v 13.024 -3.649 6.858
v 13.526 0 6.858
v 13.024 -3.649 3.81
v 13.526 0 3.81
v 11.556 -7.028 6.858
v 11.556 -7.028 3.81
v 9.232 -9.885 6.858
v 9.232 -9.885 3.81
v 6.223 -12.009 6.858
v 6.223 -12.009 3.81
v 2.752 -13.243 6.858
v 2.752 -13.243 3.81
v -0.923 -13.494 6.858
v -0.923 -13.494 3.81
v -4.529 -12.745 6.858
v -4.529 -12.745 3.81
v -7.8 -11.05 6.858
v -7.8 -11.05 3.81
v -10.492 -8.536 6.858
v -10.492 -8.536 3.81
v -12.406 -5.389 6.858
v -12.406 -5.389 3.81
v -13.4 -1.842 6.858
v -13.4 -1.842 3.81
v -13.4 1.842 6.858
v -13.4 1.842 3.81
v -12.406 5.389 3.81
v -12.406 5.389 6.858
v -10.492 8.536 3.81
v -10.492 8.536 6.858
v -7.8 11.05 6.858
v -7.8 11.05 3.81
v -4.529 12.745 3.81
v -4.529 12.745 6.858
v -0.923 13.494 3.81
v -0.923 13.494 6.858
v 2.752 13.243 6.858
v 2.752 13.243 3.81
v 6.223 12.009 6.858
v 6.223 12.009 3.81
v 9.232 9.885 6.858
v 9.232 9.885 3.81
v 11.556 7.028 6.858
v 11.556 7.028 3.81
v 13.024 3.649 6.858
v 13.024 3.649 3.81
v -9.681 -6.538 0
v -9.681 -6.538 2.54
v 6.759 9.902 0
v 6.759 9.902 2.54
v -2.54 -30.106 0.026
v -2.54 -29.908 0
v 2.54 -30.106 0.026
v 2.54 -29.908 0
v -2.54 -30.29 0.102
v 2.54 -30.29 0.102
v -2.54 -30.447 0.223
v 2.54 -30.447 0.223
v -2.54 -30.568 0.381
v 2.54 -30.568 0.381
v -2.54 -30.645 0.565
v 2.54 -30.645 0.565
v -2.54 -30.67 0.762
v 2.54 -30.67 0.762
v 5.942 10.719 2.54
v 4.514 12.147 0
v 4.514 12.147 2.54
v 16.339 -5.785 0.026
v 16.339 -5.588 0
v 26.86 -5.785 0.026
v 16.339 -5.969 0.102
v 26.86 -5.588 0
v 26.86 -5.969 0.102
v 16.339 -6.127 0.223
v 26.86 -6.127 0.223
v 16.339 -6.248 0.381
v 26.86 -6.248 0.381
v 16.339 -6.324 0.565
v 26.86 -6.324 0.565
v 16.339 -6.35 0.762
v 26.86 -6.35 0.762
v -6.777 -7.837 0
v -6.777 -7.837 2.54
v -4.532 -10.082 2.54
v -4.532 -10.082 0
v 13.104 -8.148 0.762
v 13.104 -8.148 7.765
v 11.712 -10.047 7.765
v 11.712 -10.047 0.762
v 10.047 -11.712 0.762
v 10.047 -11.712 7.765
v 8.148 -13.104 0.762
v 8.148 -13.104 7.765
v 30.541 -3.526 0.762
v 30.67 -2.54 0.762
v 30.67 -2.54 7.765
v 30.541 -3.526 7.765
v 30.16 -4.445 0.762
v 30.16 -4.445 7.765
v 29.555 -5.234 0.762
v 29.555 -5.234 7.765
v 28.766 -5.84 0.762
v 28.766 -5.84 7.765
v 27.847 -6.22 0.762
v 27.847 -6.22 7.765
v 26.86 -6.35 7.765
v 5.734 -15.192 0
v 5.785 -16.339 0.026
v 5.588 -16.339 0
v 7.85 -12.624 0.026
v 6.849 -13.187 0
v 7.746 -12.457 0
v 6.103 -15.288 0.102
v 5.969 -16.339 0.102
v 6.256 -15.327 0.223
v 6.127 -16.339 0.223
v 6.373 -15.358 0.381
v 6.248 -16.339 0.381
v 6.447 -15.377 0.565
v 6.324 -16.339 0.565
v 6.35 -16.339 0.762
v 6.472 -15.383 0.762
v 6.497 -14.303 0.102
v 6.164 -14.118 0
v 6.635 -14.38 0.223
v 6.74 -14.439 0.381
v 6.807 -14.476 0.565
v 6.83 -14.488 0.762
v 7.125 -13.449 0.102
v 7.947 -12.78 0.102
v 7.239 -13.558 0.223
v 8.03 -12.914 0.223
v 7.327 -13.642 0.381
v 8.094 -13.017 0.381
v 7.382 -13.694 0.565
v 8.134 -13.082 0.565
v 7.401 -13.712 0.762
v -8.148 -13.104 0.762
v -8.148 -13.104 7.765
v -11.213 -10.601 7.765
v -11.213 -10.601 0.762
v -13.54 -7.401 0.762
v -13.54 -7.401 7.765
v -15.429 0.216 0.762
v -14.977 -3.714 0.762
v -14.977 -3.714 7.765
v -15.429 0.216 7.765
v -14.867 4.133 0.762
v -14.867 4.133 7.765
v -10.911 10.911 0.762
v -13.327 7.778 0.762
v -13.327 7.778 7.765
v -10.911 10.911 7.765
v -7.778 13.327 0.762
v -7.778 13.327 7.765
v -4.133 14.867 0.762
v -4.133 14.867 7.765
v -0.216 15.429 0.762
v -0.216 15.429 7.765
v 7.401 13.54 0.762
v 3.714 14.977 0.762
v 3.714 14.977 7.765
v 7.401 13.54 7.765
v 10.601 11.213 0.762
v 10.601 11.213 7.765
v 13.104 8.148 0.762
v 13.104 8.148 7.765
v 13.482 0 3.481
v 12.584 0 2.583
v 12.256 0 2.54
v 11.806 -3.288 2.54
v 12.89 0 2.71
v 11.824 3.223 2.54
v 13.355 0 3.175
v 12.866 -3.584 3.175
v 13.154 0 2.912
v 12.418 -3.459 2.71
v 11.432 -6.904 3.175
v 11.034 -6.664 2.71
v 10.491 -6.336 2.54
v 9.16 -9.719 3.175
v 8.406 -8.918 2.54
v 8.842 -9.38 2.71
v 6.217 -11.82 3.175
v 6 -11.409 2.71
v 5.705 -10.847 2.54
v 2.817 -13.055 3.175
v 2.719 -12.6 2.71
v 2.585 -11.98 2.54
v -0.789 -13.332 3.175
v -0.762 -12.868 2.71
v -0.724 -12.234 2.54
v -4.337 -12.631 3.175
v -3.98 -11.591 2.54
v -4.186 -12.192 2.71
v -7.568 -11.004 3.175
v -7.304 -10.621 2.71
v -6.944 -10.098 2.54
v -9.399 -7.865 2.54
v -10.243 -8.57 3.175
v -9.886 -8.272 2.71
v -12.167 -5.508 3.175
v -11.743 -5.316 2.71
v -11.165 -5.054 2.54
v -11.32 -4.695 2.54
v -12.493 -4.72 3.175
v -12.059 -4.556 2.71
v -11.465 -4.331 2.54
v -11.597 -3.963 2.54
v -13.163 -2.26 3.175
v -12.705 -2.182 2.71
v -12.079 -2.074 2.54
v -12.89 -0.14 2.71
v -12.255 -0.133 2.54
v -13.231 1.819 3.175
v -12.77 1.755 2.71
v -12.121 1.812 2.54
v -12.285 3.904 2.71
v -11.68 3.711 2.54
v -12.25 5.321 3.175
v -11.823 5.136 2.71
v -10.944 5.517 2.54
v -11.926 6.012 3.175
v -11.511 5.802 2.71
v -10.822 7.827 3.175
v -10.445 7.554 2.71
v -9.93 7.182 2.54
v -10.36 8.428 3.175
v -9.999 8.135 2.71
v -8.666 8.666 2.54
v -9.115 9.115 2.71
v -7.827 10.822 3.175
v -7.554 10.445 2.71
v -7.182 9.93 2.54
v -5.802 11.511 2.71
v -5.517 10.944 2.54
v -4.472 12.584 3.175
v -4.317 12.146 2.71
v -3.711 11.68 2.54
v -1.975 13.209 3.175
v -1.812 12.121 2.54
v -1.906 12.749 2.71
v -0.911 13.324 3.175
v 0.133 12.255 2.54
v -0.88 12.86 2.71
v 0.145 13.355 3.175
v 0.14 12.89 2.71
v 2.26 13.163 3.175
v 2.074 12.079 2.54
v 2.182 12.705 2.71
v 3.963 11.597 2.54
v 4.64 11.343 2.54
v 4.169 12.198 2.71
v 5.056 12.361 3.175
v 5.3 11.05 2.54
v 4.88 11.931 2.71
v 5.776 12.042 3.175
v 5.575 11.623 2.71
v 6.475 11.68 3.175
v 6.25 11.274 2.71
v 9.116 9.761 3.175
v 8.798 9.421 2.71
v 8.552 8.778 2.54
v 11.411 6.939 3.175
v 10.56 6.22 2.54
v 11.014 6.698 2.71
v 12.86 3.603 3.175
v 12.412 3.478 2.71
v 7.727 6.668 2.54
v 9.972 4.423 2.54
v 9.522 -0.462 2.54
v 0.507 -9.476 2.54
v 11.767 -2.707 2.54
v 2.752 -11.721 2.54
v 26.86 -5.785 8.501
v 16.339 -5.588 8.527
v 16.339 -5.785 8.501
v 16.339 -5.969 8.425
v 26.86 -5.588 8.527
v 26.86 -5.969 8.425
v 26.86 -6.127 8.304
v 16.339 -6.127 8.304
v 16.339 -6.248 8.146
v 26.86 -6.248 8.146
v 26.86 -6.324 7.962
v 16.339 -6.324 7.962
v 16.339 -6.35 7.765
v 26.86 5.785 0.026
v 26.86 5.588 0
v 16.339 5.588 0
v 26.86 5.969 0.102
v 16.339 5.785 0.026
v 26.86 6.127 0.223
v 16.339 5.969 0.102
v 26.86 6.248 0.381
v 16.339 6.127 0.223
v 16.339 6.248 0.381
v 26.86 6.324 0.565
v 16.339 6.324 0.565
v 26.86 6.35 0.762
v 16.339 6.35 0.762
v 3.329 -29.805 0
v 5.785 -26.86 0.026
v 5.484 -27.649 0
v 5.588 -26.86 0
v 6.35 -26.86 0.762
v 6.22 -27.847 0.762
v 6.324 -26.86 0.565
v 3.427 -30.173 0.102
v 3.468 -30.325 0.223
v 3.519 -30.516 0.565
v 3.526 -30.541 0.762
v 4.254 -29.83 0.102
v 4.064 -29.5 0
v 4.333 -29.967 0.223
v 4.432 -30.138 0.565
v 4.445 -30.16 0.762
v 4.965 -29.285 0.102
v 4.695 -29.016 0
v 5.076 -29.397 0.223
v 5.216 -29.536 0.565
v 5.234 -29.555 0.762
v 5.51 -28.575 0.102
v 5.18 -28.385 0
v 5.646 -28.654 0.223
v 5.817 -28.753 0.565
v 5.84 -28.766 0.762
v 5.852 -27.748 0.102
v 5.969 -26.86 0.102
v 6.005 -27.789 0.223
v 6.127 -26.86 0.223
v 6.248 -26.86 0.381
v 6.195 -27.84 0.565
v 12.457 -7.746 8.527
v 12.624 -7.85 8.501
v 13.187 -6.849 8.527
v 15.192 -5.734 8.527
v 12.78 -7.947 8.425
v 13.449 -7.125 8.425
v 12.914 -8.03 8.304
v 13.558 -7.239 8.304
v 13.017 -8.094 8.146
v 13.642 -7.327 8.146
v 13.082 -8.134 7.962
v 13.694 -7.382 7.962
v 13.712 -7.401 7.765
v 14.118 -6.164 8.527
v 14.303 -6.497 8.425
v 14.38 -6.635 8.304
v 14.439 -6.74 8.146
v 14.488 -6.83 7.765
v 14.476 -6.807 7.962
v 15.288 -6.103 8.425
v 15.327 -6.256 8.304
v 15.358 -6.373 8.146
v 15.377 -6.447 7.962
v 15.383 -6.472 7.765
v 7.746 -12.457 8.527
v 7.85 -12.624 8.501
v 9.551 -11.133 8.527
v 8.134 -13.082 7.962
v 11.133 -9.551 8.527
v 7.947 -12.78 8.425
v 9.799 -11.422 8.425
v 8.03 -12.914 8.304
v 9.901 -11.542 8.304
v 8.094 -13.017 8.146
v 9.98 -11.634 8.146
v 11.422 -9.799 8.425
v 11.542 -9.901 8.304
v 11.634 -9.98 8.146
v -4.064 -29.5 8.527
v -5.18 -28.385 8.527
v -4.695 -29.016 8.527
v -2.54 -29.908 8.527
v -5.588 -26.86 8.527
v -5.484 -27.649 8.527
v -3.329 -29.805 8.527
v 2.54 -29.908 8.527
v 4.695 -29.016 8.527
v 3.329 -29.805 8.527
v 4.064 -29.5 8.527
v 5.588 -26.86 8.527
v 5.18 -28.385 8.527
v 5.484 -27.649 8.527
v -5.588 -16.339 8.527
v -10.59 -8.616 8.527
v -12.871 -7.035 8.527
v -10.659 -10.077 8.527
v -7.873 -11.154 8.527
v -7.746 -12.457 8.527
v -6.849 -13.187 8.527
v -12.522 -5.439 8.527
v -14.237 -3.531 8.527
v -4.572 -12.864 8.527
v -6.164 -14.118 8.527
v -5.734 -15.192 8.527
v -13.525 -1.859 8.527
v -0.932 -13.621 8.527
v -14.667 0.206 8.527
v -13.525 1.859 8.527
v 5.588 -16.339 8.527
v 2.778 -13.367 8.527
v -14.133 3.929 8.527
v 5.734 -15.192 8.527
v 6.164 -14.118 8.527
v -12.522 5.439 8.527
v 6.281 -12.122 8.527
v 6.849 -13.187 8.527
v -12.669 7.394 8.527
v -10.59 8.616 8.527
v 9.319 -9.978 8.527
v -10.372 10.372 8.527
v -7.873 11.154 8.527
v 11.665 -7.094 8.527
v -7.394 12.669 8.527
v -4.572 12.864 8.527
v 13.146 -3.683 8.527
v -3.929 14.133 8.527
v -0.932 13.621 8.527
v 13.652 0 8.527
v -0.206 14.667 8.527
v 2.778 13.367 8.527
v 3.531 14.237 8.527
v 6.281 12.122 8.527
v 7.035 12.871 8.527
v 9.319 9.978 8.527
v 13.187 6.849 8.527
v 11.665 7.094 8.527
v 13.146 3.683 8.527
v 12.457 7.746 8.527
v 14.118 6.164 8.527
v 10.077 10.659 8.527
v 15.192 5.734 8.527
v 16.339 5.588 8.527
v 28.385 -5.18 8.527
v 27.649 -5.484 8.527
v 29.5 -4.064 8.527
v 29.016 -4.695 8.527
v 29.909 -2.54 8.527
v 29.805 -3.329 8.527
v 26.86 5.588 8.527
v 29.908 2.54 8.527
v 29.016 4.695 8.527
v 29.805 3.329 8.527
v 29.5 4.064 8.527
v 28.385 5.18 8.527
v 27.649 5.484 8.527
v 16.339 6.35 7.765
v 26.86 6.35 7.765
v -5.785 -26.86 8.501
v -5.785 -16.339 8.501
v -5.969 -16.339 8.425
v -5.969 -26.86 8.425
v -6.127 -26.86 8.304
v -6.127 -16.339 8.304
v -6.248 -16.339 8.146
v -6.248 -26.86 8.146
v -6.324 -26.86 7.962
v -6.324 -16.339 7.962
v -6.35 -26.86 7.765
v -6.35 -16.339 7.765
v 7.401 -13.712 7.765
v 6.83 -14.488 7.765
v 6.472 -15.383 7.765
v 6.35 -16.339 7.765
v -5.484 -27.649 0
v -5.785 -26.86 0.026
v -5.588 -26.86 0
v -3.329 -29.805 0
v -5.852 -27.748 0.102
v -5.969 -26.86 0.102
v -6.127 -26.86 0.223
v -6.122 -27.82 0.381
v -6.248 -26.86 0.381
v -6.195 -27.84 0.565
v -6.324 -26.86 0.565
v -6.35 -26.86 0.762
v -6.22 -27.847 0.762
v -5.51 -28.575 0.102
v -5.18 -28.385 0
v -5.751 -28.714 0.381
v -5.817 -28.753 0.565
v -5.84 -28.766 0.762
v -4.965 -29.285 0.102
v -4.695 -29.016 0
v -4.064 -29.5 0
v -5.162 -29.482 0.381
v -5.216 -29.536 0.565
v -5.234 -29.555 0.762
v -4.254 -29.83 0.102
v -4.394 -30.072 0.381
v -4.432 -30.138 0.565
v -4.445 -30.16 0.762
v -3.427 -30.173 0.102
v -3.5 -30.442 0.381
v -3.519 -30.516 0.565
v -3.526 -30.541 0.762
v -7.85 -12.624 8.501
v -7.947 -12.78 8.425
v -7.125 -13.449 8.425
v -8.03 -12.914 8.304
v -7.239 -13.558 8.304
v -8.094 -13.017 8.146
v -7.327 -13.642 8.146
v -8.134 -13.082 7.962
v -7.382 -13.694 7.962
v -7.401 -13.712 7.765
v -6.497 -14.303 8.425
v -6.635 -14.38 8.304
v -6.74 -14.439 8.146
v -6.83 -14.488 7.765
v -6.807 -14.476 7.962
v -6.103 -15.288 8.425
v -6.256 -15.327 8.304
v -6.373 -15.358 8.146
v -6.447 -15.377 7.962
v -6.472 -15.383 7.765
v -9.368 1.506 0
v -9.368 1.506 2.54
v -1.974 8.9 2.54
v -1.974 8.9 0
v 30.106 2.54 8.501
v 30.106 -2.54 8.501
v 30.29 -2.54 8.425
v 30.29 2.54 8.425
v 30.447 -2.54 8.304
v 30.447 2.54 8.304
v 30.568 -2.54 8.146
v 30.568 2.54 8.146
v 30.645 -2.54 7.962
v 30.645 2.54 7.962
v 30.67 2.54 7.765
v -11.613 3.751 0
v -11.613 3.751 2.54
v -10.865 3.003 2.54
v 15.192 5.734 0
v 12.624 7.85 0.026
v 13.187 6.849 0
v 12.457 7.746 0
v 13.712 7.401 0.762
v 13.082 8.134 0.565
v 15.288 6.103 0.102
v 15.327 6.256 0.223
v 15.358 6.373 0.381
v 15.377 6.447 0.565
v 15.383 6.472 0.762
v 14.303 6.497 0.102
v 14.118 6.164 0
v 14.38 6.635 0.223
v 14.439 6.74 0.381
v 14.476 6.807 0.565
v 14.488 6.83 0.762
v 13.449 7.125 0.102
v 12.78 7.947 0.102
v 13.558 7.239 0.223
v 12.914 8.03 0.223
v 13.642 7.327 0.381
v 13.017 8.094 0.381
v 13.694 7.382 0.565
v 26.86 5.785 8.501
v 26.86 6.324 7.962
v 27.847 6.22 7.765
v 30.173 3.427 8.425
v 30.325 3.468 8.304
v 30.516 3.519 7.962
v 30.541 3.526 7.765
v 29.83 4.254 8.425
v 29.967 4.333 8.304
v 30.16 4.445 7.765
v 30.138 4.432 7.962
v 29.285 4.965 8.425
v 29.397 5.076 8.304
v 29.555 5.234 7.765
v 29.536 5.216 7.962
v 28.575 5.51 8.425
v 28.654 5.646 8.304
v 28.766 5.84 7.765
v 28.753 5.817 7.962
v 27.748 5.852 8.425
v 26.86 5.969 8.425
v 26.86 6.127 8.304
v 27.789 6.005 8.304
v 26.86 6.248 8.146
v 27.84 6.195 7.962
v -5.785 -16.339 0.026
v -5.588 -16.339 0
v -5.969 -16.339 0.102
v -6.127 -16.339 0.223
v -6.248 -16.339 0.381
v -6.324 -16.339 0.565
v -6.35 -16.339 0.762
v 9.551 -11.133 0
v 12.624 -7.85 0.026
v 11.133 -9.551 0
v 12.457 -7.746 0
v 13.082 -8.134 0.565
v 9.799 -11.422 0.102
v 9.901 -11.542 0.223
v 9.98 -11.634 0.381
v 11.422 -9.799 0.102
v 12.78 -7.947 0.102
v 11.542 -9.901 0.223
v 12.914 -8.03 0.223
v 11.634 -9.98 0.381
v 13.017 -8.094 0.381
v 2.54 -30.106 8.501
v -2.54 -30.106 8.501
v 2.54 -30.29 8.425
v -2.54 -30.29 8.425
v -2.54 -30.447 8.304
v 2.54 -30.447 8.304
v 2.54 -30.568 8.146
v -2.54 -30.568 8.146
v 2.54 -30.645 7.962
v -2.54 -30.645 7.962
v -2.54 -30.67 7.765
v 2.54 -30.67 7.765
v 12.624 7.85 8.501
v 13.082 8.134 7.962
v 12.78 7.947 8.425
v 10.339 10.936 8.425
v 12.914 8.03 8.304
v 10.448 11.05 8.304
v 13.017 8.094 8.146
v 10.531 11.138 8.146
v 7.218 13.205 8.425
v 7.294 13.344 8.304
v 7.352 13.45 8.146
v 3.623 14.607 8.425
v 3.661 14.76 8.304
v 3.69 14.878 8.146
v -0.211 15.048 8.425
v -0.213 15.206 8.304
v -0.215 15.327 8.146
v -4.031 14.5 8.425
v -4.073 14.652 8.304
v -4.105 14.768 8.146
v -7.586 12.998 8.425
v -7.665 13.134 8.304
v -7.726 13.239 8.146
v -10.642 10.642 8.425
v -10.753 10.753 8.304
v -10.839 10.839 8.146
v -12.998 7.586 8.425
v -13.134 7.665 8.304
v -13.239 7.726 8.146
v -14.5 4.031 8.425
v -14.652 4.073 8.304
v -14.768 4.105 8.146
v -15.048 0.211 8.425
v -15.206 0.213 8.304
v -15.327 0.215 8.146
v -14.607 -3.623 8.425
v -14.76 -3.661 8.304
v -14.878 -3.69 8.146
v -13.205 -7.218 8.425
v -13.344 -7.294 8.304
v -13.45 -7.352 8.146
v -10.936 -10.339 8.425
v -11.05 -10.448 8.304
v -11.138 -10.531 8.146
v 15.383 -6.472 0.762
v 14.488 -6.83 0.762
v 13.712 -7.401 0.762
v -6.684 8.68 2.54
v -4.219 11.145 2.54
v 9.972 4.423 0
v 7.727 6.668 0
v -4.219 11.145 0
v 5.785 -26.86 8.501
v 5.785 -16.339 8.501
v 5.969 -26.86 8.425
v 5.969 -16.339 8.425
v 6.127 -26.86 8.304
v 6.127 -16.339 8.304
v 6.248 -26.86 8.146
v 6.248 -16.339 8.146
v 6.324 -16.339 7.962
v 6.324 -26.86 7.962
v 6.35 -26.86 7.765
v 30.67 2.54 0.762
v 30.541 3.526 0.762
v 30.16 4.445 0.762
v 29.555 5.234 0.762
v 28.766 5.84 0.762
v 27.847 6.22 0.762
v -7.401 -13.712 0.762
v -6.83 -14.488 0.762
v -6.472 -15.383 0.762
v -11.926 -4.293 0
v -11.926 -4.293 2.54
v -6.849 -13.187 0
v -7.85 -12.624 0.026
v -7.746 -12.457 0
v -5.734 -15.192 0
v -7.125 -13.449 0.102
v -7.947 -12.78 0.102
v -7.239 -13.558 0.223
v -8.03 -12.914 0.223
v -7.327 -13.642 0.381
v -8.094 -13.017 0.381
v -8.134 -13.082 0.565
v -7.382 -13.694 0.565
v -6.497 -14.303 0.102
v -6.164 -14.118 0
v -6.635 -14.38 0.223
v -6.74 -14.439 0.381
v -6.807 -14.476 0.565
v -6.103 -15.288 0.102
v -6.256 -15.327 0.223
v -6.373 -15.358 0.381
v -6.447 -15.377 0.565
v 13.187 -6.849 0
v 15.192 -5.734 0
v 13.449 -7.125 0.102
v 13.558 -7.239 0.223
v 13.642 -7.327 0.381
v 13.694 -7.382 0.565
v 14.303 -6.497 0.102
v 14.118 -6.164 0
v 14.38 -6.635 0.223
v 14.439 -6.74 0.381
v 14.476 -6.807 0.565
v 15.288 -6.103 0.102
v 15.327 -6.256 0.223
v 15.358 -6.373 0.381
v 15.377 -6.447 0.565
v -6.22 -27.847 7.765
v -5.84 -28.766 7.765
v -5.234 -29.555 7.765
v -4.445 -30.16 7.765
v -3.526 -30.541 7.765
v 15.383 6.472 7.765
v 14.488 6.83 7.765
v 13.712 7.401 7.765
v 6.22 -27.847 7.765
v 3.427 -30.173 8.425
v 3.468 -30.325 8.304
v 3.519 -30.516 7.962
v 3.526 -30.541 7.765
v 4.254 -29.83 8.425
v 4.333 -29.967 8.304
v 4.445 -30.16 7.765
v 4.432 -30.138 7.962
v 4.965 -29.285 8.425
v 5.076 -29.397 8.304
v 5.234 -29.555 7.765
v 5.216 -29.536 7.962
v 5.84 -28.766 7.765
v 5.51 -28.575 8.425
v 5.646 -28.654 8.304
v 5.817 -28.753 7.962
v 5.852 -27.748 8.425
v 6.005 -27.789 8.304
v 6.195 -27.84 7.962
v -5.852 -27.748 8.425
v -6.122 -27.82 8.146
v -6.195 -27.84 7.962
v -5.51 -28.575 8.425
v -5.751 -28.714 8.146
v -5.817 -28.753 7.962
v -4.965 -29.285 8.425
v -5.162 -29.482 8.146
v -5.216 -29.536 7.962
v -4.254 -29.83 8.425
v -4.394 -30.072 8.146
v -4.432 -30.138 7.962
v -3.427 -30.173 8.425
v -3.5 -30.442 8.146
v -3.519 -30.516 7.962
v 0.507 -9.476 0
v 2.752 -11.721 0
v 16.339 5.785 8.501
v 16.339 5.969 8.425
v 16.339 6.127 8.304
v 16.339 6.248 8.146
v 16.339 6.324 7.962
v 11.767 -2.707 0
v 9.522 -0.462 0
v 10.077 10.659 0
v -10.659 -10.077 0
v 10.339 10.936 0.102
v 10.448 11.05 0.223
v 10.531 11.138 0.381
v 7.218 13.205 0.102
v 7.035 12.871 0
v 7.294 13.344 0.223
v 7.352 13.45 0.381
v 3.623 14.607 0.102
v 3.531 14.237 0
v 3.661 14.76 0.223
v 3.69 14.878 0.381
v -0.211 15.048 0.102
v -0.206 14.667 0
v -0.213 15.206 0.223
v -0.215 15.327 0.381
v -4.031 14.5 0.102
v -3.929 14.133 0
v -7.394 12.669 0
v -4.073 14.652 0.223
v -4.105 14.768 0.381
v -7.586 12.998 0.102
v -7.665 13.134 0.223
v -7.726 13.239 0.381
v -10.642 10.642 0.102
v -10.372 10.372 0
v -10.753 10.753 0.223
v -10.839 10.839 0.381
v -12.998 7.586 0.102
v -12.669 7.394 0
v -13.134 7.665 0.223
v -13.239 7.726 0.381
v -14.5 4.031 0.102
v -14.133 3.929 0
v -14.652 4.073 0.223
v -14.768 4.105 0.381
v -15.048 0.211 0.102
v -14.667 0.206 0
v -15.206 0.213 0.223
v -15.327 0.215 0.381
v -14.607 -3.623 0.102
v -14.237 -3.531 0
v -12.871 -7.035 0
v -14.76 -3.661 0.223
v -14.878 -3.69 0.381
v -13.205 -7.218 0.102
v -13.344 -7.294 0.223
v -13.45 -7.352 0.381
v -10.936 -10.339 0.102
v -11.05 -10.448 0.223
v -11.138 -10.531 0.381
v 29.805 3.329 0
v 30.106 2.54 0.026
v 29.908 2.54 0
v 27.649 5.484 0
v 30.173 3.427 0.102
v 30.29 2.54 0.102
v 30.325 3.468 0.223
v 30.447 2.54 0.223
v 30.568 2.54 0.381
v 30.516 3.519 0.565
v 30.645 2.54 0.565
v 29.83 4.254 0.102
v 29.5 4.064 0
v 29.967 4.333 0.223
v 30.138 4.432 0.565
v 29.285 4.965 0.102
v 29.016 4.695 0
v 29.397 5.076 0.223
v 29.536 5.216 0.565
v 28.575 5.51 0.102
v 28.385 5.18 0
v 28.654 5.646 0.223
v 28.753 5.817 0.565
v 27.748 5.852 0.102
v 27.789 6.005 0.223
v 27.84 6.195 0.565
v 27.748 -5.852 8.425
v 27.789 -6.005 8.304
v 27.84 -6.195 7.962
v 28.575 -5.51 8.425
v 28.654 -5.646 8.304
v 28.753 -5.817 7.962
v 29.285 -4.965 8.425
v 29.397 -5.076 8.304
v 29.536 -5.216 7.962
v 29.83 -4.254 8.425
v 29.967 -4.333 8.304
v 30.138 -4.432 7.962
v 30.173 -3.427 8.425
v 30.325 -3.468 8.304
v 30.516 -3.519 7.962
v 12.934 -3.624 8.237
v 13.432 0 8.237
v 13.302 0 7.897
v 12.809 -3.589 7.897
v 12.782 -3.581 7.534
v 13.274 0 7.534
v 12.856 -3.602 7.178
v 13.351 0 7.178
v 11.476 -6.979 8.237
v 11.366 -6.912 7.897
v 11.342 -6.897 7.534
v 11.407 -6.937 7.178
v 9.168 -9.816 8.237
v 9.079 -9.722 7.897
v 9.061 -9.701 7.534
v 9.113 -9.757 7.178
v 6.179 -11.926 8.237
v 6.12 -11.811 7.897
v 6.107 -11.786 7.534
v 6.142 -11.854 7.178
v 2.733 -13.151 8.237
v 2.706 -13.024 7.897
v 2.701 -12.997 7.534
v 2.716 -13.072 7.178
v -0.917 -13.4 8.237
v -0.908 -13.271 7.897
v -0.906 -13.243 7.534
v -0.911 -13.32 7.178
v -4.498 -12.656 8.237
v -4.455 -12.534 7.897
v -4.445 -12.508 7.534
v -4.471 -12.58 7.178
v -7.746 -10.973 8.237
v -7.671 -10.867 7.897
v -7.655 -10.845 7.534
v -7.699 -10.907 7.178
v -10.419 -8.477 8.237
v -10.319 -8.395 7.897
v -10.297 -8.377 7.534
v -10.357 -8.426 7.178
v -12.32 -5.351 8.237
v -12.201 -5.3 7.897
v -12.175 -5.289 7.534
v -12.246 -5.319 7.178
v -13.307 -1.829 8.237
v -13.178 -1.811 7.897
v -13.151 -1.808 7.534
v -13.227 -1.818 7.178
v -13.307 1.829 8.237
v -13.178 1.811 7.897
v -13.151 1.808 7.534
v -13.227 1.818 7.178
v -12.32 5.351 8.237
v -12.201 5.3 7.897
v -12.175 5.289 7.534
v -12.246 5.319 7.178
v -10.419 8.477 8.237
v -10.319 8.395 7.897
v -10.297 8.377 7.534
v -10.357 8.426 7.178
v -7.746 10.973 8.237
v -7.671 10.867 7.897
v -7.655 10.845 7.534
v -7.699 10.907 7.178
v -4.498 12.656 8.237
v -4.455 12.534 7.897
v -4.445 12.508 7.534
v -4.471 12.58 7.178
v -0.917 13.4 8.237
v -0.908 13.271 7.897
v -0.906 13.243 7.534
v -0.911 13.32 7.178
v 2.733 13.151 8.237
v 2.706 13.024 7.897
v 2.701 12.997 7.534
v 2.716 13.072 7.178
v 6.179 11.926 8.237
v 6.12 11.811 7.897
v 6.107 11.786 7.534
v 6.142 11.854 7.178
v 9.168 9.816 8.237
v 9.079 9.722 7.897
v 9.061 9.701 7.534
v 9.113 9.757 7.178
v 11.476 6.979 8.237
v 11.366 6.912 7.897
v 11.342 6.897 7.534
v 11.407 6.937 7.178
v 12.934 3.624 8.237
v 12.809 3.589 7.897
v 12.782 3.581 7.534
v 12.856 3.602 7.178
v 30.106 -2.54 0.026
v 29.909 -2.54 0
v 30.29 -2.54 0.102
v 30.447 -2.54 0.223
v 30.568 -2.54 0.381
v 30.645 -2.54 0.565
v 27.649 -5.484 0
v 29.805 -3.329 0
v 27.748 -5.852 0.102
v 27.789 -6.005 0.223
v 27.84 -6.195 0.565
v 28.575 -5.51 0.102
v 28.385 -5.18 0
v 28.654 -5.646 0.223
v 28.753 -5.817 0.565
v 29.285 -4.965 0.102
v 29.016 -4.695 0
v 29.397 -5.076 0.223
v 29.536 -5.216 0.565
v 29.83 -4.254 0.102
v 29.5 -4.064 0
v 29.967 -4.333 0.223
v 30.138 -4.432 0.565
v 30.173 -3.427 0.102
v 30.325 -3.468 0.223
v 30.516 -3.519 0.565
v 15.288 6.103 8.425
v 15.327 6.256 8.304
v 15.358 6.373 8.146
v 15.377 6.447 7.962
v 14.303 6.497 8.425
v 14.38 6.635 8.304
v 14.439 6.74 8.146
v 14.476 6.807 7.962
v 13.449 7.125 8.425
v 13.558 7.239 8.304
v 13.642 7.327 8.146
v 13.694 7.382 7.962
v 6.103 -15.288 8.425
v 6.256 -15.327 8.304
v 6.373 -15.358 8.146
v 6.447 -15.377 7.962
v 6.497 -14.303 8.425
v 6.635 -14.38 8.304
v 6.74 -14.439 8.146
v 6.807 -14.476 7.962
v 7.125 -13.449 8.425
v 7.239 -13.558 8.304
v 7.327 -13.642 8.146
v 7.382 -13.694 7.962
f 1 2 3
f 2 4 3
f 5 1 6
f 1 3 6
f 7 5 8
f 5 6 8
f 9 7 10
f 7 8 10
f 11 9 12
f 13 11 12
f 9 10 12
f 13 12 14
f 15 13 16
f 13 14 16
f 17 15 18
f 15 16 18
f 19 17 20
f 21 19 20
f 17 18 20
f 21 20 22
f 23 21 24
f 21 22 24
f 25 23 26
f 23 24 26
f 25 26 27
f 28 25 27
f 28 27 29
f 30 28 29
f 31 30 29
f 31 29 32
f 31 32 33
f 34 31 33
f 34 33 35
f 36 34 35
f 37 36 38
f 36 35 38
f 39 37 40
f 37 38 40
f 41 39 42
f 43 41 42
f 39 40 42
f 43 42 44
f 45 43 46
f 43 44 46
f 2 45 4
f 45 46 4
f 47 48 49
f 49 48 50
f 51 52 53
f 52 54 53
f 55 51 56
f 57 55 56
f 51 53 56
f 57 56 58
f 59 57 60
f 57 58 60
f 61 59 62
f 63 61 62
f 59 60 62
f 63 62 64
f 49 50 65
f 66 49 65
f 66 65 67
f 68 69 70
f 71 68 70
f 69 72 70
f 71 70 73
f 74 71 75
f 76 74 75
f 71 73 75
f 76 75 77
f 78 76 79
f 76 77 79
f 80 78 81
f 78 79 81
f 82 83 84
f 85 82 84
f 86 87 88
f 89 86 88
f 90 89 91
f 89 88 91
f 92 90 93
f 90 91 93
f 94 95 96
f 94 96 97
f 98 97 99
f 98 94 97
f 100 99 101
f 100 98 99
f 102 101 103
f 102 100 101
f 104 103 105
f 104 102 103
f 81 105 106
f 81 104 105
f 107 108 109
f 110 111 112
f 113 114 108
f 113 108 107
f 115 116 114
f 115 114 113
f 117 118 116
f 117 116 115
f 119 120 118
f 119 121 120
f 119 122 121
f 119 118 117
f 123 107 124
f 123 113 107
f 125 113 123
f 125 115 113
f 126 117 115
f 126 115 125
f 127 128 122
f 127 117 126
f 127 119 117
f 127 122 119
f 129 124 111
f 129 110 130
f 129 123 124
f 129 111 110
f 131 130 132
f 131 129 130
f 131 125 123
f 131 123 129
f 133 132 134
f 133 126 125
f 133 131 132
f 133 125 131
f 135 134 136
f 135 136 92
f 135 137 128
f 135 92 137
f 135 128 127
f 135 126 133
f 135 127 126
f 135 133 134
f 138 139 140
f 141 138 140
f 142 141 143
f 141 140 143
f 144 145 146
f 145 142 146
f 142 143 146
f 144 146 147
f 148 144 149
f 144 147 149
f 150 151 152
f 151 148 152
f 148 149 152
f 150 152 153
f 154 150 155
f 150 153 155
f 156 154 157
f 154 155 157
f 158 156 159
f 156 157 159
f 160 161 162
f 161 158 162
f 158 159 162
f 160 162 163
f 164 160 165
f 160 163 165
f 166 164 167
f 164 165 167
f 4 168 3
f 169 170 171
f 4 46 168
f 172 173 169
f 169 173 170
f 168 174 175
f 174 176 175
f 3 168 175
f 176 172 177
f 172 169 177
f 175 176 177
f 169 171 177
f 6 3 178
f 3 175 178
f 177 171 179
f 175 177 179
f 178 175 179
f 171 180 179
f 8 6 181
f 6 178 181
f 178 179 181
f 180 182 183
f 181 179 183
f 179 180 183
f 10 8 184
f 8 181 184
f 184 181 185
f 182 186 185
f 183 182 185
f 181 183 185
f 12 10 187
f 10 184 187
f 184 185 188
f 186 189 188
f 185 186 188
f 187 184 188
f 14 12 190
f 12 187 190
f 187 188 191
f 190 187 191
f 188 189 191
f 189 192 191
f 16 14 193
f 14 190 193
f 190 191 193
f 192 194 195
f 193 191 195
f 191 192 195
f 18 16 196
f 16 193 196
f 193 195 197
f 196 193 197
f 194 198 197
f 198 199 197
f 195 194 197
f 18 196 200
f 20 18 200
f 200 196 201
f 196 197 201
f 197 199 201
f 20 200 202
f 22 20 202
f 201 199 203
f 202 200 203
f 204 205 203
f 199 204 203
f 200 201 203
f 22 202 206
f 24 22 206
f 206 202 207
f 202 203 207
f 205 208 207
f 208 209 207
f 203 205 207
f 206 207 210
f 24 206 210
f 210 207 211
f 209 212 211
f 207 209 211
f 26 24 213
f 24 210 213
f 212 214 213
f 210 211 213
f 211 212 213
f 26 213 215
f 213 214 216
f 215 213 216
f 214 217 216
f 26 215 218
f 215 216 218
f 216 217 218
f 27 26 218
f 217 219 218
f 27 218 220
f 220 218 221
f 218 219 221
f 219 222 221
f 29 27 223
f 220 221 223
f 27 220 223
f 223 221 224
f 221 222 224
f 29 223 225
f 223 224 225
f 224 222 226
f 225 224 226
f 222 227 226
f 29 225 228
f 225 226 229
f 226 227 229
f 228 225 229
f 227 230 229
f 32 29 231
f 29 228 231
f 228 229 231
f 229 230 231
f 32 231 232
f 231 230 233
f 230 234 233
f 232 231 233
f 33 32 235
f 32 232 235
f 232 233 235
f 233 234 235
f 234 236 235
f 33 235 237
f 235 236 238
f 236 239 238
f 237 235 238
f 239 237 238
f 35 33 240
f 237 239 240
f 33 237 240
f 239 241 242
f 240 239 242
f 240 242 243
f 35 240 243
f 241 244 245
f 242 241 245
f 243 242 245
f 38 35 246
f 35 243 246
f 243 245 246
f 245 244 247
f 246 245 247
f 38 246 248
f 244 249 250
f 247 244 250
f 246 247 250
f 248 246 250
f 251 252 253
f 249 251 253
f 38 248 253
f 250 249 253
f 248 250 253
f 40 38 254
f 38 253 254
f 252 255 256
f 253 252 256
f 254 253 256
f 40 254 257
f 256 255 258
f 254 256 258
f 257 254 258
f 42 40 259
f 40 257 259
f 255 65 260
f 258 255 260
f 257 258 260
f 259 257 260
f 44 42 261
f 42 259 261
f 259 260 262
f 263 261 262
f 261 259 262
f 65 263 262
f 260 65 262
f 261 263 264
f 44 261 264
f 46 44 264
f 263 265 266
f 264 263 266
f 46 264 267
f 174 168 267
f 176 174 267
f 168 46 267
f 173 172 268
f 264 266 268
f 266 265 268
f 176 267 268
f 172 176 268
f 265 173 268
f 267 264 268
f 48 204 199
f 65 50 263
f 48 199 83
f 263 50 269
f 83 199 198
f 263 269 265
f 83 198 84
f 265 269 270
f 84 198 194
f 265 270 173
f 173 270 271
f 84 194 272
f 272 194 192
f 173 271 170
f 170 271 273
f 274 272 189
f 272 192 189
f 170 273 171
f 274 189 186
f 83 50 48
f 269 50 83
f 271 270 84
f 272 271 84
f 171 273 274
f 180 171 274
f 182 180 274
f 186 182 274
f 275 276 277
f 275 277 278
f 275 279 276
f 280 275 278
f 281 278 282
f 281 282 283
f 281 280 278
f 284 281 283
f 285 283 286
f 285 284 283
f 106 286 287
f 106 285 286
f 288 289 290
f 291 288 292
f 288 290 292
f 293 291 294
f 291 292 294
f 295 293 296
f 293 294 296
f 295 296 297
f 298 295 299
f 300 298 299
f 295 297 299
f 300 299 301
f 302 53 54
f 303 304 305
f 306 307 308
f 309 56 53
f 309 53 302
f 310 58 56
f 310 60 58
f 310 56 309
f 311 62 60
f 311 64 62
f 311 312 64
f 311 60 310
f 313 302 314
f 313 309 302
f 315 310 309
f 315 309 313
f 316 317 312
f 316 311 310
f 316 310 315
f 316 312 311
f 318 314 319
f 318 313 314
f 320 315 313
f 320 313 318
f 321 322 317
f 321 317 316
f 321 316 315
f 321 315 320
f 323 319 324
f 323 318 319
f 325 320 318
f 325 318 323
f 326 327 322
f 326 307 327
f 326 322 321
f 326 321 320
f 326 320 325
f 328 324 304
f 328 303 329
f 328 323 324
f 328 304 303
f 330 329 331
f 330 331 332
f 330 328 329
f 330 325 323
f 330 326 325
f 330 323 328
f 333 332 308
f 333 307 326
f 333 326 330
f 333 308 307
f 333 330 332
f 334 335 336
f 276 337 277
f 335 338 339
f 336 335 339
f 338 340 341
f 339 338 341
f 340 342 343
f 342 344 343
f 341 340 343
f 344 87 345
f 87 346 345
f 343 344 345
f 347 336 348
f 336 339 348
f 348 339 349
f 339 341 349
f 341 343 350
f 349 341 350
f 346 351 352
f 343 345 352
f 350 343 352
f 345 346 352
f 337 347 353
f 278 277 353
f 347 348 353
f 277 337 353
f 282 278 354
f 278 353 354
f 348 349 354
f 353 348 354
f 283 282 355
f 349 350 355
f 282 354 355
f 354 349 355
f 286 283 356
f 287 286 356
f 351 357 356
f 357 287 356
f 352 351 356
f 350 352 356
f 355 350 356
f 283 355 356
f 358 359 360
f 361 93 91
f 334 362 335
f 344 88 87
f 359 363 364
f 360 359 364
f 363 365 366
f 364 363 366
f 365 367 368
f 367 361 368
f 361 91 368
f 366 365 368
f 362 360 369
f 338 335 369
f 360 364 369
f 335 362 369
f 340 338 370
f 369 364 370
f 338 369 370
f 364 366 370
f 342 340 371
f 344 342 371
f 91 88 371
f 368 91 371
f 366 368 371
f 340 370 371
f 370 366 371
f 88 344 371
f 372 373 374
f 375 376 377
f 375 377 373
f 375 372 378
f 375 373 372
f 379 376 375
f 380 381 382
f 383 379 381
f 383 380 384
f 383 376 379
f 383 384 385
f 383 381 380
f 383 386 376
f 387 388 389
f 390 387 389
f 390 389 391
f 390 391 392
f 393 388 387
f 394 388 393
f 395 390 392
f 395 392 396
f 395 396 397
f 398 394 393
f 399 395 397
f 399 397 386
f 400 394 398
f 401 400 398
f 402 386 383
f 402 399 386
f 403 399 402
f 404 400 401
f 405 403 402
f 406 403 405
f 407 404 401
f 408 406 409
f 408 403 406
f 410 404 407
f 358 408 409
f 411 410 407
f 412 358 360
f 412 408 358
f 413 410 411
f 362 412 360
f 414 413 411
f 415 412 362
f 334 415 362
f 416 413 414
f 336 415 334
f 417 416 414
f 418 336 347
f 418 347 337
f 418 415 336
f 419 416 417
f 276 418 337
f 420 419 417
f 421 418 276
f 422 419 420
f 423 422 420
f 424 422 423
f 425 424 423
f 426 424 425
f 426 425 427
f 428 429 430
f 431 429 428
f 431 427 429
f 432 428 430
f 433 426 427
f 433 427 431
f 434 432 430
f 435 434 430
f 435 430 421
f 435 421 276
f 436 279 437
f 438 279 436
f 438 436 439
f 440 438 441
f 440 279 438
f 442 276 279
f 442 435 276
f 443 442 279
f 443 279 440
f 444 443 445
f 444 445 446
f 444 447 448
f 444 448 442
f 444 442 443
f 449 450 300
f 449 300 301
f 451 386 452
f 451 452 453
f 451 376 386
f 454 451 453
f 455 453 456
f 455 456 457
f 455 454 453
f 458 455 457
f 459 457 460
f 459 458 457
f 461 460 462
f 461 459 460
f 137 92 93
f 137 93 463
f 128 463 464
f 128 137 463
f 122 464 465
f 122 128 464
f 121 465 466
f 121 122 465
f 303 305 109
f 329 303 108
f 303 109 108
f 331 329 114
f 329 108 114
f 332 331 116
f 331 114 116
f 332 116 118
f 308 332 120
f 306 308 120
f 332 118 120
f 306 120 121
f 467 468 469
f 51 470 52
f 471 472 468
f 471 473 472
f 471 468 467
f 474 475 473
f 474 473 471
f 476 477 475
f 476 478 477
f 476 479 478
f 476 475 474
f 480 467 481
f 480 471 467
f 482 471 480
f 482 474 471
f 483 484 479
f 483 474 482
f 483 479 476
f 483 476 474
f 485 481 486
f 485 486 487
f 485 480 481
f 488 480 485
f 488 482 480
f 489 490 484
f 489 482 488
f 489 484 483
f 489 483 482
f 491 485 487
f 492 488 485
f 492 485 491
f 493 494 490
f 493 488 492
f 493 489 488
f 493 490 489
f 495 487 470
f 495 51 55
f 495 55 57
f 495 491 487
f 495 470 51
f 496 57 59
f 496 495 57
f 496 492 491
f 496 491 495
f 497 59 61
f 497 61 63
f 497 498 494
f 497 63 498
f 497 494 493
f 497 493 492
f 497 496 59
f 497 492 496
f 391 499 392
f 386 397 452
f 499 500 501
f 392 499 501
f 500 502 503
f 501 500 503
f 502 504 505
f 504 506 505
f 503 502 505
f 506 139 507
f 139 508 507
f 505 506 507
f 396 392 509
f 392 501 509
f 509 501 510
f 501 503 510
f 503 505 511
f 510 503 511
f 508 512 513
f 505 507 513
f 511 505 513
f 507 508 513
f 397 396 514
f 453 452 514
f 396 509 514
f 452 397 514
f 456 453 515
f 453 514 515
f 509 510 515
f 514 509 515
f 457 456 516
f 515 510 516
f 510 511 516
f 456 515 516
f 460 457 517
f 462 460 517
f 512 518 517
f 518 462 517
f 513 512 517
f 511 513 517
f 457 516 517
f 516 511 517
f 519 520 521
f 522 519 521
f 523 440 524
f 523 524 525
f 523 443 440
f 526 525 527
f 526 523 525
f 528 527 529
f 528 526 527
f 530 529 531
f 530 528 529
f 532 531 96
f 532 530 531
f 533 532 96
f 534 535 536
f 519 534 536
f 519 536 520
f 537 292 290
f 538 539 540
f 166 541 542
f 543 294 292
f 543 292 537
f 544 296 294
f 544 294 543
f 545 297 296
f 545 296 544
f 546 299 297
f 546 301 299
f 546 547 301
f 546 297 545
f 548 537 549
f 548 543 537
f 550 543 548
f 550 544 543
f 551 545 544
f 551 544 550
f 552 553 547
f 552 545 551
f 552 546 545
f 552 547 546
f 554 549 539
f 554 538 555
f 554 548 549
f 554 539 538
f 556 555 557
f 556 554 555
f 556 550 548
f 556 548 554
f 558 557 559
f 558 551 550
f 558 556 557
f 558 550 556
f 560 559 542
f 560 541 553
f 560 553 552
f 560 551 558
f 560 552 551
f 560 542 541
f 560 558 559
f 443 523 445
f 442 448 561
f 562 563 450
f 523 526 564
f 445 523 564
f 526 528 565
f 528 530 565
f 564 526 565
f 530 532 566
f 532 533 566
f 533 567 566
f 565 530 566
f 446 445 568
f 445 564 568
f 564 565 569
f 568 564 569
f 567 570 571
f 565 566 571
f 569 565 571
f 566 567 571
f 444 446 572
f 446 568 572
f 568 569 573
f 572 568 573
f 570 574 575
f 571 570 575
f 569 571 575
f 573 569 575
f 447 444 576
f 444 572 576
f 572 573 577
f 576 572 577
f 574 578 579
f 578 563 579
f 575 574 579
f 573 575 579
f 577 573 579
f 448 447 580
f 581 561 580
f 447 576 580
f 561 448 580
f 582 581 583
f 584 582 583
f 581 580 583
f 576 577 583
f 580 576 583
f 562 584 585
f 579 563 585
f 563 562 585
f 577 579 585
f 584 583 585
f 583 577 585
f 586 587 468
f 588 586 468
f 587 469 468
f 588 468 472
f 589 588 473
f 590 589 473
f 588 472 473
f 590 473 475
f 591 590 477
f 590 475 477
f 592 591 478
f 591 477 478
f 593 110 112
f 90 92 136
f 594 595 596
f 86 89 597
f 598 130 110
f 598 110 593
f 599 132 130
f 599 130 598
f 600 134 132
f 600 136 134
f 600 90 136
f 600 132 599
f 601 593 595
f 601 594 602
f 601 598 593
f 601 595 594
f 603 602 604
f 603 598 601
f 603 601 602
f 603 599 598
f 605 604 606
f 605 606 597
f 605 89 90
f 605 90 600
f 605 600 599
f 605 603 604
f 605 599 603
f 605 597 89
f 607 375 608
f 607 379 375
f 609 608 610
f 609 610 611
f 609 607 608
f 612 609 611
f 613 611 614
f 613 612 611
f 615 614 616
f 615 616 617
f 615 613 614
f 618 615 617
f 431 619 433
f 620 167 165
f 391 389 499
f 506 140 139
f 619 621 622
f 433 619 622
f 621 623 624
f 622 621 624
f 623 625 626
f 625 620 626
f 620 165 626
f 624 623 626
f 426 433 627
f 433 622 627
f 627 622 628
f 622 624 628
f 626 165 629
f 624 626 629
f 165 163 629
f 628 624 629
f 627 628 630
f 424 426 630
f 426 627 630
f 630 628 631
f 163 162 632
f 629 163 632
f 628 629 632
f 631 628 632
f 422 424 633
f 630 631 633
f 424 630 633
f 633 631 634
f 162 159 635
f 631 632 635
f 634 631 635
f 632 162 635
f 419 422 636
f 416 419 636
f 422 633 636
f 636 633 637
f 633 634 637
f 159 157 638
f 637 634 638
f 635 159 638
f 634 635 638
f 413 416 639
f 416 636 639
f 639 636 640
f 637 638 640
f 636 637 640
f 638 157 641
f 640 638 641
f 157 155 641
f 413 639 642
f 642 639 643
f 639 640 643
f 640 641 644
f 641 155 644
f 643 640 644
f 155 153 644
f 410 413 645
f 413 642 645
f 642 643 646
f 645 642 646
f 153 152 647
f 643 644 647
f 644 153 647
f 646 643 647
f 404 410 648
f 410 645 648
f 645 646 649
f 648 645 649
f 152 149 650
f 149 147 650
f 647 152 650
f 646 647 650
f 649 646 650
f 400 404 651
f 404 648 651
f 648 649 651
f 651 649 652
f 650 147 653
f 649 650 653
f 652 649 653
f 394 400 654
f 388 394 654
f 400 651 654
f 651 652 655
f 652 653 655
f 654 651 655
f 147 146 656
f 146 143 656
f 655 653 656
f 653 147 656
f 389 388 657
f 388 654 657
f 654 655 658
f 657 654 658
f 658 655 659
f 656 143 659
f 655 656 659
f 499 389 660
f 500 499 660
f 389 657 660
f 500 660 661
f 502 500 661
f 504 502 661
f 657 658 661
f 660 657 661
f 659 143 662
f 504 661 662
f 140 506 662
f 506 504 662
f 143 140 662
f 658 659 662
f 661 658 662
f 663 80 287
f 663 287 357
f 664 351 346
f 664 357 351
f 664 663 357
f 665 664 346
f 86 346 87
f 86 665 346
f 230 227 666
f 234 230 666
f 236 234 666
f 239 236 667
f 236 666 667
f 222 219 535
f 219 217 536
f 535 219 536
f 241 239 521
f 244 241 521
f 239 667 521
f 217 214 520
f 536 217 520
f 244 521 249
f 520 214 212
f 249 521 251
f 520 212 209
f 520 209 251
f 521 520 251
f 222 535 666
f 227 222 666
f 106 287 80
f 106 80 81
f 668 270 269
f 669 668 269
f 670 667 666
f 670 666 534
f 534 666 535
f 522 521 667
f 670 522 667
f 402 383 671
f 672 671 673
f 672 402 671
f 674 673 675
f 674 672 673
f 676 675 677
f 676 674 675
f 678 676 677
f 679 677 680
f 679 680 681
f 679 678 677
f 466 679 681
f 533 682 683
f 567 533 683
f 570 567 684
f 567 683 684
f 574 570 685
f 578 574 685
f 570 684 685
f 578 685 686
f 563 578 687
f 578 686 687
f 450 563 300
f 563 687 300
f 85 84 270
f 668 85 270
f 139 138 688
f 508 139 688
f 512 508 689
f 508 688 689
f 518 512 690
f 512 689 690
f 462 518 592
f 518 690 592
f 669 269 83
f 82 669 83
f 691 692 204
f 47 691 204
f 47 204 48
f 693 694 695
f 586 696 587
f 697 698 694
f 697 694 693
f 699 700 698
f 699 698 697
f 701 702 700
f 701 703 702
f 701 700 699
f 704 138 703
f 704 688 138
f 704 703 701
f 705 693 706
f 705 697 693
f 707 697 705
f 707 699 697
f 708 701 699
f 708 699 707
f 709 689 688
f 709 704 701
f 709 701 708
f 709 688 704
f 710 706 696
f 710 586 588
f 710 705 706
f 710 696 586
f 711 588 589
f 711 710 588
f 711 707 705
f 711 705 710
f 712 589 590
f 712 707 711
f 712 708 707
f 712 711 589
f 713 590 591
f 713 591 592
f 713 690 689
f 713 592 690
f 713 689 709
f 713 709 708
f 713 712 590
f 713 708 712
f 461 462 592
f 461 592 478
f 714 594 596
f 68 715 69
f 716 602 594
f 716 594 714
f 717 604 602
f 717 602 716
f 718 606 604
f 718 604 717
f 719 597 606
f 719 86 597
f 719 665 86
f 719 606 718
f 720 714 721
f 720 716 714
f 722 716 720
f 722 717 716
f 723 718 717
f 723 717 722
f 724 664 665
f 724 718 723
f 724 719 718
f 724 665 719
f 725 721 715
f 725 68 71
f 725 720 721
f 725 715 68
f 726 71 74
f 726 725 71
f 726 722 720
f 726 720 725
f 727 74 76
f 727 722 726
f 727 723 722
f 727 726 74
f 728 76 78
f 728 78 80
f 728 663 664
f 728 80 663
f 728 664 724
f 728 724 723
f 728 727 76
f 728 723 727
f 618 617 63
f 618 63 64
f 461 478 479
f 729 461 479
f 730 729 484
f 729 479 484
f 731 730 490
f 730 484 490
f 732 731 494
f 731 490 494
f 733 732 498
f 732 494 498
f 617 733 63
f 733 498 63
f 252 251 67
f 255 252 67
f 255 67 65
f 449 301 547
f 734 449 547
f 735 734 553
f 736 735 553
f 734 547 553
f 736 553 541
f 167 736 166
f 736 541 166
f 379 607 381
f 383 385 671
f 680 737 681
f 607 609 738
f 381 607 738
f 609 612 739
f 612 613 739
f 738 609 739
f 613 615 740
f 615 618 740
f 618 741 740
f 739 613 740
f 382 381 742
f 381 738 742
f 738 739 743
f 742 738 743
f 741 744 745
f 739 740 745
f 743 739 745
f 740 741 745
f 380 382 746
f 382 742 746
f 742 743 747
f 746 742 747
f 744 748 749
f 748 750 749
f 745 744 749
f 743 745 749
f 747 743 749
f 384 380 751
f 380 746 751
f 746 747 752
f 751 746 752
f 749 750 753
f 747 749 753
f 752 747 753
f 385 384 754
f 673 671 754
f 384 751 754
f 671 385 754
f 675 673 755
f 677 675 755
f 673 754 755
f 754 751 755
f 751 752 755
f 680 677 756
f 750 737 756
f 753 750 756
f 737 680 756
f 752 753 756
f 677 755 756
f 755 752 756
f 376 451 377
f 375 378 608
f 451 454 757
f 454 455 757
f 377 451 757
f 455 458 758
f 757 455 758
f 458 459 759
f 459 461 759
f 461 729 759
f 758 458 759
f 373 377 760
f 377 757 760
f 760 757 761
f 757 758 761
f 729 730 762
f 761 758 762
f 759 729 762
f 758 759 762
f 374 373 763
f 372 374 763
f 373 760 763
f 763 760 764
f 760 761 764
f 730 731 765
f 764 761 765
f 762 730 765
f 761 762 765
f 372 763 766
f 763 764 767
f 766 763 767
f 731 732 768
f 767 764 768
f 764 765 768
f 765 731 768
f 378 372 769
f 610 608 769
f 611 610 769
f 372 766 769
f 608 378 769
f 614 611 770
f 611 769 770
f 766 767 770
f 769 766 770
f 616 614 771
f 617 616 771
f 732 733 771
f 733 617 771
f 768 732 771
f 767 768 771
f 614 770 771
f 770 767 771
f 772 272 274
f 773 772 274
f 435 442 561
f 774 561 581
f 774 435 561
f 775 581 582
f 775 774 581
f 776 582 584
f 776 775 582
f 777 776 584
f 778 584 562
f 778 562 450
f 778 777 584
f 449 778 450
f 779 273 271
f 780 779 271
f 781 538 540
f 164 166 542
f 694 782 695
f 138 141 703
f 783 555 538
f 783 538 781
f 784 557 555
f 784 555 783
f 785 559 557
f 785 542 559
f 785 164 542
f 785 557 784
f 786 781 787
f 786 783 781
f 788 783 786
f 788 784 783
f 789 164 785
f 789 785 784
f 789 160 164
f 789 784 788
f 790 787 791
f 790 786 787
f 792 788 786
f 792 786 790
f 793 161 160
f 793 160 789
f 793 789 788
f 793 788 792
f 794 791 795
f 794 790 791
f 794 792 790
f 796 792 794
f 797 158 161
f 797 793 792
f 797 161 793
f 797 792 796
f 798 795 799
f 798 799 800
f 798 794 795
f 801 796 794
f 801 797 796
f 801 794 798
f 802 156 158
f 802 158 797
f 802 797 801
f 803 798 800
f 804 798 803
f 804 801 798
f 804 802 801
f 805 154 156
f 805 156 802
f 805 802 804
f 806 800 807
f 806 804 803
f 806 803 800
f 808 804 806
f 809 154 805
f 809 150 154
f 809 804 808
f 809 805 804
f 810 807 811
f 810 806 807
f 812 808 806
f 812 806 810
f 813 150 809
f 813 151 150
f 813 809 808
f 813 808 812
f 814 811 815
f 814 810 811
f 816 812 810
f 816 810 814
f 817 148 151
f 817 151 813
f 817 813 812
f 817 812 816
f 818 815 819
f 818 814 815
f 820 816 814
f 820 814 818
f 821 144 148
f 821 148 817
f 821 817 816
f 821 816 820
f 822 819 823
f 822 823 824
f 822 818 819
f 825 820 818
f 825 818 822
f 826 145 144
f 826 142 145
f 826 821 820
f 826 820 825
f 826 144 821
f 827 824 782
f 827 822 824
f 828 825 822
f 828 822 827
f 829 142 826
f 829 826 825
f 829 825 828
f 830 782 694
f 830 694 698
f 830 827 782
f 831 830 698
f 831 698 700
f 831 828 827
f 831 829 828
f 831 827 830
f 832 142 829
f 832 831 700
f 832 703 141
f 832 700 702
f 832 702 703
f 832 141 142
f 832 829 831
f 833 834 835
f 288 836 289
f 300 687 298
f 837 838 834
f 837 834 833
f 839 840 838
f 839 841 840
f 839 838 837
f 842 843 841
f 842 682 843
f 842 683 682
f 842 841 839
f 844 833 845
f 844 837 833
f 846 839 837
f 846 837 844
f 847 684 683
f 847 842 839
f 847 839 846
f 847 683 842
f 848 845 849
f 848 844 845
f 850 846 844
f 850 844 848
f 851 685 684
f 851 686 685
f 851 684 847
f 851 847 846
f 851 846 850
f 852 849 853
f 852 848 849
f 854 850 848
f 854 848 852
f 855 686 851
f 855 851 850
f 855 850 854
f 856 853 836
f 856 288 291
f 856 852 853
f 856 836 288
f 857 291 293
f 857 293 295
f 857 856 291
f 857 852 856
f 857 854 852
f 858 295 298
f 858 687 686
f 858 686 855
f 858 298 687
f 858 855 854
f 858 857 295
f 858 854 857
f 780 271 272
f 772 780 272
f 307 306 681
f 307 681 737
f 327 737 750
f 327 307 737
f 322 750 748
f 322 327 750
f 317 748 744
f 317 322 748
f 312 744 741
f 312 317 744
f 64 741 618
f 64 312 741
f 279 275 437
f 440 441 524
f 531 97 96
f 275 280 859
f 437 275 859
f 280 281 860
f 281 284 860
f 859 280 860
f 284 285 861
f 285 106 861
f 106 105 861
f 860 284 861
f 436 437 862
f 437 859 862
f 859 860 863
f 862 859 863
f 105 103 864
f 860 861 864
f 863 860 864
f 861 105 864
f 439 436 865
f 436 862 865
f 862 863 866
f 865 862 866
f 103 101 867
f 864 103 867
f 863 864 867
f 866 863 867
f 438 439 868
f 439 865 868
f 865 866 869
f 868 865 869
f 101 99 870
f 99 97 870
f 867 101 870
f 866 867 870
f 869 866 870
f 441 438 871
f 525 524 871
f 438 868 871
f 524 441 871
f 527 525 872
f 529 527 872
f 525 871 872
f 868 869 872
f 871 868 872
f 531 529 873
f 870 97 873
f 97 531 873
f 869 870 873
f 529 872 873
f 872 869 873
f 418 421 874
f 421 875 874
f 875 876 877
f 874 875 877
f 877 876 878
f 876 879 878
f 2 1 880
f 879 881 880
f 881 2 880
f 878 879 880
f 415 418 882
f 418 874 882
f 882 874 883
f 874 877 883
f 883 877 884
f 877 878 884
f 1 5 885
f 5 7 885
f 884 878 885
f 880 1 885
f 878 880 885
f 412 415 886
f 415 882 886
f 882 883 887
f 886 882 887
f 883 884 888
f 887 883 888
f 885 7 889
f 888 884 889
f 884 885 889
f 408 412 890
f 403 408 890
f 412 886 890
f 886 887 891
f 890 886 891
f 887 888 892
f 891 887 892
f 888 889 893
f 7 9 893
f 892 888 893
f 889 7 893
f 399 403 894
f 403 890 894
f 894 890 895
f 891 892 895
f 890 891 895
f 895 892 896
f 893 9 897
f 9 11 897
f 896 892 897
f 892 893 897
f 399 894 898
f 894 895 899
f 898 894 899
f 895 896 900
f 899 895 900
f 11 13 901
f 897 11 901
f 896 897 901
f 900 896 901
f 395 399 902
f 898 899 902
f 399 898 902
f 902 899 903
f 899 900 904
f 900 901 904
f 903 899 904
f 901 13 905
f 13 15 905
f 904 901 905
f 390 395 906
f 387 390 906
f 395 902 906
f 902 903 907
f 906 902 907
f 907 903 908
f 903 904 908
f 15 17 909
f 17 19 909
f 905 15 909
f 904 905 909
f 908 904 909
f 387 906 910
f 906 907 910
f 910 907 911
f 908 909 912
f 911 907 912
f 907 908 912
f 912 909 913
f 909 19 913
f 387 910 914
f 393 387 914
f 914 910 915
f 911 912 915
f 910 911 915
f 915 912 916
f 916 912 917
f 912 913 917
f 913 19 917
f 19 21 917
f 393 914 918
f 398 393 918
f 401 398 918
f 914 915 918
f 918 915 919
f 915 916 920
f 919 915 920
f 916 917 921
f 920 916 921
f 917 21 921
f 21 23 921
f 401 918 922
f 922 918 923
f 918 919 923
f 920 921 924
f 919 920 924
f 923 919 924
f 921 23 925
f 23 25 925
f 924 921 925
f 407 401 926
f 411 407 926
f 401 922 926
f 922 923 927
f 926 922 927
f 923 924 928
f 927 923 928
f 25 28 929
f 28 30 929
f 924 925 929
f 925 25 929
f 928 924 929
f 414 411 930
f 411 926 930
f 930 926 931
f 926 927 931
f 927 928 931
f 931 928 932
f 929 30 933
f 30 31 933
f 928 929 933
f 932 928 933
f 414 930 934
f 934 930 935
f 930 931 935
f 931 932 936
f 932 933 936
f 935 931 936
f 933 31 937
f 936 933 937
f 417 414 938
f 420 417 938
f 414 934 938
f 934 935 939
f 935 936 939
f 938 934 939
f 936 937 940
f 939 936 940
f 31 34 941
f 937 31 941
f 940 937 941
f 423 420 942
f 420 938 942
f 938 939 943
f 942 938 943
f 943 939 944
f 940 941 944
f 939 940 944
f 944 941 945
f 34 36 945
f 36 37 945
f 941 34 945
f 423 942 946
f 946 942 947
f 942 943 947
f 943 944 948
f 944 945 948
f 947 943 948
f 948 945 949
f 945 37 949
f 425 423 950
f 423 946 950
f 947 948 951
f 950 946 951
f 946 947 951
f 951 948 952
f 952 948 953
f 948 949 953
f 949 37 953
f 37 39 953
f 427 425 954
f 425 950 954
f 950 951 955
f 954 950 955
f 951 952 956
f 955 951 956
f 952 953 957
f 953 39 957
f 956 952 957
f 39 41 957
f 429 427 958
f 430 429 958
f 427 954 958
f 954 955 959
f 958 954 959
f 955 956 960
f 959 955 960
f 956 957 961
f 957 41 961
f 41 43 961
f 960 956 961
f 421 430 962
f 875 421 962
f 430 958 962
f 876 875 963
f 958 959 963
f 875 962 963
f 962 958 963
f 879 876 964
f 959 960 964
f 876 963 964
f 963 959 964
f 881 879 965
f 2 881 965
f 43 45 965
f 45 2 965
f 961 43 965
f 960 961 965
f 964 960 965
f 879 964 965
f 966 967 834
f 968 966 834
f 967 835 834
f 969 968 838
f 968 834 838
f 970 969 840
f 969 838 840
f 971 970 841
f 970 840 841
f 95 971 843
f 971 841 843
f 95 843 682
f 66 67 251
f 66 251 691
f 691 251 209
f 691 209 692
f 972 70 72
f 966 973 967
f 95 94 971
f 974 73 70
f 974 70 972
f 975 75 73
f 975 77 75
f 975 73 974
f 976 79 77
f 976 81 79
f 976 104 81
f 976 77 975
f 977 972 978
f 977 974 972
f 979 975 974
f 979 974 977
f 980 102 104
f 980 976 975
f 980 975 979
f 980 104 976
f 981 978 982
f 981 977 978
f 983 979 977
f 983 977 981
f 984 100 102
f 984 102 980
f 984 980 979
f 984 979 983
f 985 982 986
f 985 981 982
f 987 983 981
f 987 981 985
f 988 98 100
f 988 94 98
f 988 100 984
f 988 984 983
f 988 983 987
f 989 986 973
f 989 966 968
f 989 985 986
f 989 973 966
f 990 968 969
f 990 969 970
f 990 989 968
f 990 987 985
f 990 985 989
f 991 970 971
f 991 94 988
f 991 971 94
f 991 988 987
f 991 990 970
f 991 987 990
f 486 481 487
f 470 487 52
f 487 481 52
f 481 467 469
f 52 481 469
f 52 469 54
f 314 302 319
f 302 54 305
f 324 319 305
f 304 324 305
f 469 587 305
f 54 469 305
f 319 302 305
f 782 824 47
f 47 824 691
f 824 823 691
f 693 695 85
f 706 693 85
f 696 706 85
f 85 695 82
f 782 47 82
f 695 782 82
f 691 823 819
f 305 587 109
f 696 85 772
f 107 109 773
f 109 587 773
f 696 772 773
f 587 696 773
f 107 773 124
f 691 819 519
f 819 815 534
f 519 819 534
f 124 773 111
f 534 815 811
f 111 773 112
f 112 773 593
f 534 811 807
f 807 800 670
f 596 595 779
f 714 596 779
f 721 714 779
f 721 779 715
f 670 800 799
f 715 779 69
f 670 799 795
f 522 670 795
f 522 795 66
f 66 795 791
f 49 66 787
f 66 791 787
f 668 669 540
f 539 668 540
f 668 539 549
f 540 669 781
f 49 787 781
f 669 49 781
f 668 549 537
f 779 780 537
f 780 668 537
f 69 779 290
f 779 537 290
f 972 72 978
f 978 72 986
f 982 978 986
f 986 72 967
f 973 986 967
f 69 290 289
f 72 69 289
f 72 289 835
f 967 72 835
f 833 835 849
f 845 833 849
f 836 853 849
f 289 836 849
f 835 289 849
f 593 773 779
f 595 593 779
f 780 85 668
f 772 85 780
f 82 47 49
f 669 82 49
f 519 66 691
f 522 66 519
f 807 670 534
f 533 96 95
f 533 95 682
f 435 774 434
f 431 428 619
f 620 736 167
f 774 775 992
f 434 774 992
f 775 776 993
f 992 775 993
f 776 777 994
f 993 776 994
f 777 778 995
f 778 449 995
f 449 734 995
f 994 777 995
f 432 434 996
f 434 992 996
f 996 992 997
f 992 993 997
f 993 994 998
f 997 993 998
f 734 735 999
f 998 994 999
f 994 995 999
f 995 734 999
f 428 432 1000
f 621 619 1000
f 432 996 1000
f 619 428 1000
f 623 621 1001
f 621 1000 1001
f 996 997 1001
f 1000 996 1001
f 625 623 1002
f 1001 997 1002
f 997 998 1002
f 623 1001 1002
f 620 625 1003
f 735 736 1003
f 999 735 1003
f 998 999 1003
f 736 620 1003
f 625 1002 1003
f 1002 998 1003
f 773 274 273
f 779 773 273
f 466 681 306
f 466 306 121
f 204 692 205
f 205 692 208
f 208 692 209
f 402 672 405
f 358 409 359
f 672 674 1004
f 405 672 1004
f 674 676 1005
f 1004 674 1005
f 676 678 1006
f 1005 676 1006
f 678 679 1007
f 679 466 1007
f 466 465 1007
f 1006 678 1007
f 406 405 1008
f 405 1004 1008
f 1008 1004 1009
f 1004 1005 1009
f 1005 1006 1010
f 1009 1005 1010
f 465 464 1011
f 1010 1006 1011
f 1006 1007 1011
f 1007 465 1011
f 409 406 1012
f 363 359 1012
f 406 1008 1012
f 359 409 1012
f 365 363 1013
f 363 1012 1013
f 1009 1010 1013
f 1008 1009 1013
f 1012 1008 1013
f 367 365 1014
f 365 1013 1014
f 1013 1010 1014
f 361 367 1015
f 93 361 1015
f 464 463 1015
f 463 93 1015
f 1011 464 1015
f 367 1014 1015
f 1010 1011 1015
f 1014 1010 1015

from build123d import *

# Parameters (mm, degrees)
F3_DEPTH = 8.5269614104
F4_R     = 3.81
F5_R     = 0.762
F7_DEPTH = 25.4


with BuildPart() as f1:
    # F0 (on Front) → F1 (revolve)
    with BuildSketch(Plane.XZ):
        with BuildLine():
            Line((15.4305, 0), (15.4305, 6.7130385896))
            ThreePointArc((15.4305, 6.7130385896), (14.4451376493, 6.3536610654), (13.5255, 6.858))
            Line((13.5255, 6.858), (13.5255, 3.81))
            ThreePointArc((13.5255, 3.81), (13.1535256121, 2.9119743879), (12.2555, 2.54))
            Line((12.2555, 2.54), (0, 2.54))
            Line((0, 2.54), (0, 0))
            Line((0, 0), (15.4305, 0))
        make_face()
        with BuildLine():
            ThreePointArc((13.5255, 6.858), (14.4451376493, 6.3536610654), (15.4305, 6.7130385896))
            Line((15.4305, 6.7130385896), (15.4305, 8.5269614104))
            Line((15.4305, 8.5269614104), (13.6525, 8.5269614104))
            ThreePointArc((13.6525, 8.5269614104), (13.2751610654, 7.7163623507), (13.5255, 6.858))
        make_face()
    revolve(axis=Axis((0, 0, 4.2298094004), (0, 0, -1)))

    # F2 (on face) → F3 (join, through all)
    with BuildSketch(Plane.XY.offset(8.5269614104)):
        with BuildLine():
            Line((30.6705, -6.35), (30.6705, 6.35))
            Line((30.6705, 6.35), (14.0633506054, 6.35))
            ThreePointArc((14.0633506054, 6.35), (15.4305, 0), (14.0633506054, -6.35))
            Line((14.0633506054, -6.35), (30.6705, -6.35))
        make_face()
        with BuildLine():
            Line((-6.35, -30.6705), (6.35, -30.6705))
            Line((6.35, -30.6705), (6.35, -14.0633506054))
            ThreePointArc((6.35, -14.0633506054), (0, -15.4305), (-6.35, -14.0633506054))
            Line((-6.35, -14.0633506054), (-6.35, -30.6705))
        make_face()
    extrude(amount=-F3_DEPTH)

    # F4
    f4_edges = [f1.edges().sort_by_distance(p)[0] for p in [
        (-6.35, -30.6705, 4.263481),
        (-6.35, -14.063351, 4.263481),
        (6.35, -30.6705, 4.263481),
        (6.35, -14.063351, 4.263481),
        (14.063351, -6.35, 4.263481),
        (30.6705, -6.35, 4.263481),
        (30.6705, 6.35, 4.263481),
        (14.063351, 6.35, 4.263481),
    ]]
    fillet(f4_edges, radius=F4_R)

    # F5
    f5_edges = [f1.edges().sort_by_distance(p)[0] for p in [
        (0, -30.6705, 8.526961),
        (0, -30.6705, 0),
    ]]
    fillet(f5_edges, radius=F5_R)

    # F6 (on face) → F7 (cut)
    with BuildSketch(Plane.XY.offset(2.54)):
        Polygon((2.7523231475, -11.7213891216), (11.76669461, -2.7070176591), (9.5216305797, -0.4619536288), (0.5072591172, -9.4763250914), align=None)
        Polygon((-4.5321477931, -10.0819004043), (9.9724980907, 4.4227454795), (7.7274340604, 6.6678095097), (-6.7772118234, -7.836836374), align=None)
        Polygon((-9.6811759284, -6.5377472694), (6.7586679854, 9.9020966443), (4.5136039551, 12.1471606746), (-11.9262399586, -4.2926832391), align=None)
        Polygon((-9.3679427371, 1.5062135006), (-1.974369983, 8.8997862547), (-4.2194340133, 11.144850285), (-11.6130067674, 3.7512775309), align=None)
    extrude(amount=-F7_DEPTH, mode=Mode.SUBTRACT)


solid = f1.part
